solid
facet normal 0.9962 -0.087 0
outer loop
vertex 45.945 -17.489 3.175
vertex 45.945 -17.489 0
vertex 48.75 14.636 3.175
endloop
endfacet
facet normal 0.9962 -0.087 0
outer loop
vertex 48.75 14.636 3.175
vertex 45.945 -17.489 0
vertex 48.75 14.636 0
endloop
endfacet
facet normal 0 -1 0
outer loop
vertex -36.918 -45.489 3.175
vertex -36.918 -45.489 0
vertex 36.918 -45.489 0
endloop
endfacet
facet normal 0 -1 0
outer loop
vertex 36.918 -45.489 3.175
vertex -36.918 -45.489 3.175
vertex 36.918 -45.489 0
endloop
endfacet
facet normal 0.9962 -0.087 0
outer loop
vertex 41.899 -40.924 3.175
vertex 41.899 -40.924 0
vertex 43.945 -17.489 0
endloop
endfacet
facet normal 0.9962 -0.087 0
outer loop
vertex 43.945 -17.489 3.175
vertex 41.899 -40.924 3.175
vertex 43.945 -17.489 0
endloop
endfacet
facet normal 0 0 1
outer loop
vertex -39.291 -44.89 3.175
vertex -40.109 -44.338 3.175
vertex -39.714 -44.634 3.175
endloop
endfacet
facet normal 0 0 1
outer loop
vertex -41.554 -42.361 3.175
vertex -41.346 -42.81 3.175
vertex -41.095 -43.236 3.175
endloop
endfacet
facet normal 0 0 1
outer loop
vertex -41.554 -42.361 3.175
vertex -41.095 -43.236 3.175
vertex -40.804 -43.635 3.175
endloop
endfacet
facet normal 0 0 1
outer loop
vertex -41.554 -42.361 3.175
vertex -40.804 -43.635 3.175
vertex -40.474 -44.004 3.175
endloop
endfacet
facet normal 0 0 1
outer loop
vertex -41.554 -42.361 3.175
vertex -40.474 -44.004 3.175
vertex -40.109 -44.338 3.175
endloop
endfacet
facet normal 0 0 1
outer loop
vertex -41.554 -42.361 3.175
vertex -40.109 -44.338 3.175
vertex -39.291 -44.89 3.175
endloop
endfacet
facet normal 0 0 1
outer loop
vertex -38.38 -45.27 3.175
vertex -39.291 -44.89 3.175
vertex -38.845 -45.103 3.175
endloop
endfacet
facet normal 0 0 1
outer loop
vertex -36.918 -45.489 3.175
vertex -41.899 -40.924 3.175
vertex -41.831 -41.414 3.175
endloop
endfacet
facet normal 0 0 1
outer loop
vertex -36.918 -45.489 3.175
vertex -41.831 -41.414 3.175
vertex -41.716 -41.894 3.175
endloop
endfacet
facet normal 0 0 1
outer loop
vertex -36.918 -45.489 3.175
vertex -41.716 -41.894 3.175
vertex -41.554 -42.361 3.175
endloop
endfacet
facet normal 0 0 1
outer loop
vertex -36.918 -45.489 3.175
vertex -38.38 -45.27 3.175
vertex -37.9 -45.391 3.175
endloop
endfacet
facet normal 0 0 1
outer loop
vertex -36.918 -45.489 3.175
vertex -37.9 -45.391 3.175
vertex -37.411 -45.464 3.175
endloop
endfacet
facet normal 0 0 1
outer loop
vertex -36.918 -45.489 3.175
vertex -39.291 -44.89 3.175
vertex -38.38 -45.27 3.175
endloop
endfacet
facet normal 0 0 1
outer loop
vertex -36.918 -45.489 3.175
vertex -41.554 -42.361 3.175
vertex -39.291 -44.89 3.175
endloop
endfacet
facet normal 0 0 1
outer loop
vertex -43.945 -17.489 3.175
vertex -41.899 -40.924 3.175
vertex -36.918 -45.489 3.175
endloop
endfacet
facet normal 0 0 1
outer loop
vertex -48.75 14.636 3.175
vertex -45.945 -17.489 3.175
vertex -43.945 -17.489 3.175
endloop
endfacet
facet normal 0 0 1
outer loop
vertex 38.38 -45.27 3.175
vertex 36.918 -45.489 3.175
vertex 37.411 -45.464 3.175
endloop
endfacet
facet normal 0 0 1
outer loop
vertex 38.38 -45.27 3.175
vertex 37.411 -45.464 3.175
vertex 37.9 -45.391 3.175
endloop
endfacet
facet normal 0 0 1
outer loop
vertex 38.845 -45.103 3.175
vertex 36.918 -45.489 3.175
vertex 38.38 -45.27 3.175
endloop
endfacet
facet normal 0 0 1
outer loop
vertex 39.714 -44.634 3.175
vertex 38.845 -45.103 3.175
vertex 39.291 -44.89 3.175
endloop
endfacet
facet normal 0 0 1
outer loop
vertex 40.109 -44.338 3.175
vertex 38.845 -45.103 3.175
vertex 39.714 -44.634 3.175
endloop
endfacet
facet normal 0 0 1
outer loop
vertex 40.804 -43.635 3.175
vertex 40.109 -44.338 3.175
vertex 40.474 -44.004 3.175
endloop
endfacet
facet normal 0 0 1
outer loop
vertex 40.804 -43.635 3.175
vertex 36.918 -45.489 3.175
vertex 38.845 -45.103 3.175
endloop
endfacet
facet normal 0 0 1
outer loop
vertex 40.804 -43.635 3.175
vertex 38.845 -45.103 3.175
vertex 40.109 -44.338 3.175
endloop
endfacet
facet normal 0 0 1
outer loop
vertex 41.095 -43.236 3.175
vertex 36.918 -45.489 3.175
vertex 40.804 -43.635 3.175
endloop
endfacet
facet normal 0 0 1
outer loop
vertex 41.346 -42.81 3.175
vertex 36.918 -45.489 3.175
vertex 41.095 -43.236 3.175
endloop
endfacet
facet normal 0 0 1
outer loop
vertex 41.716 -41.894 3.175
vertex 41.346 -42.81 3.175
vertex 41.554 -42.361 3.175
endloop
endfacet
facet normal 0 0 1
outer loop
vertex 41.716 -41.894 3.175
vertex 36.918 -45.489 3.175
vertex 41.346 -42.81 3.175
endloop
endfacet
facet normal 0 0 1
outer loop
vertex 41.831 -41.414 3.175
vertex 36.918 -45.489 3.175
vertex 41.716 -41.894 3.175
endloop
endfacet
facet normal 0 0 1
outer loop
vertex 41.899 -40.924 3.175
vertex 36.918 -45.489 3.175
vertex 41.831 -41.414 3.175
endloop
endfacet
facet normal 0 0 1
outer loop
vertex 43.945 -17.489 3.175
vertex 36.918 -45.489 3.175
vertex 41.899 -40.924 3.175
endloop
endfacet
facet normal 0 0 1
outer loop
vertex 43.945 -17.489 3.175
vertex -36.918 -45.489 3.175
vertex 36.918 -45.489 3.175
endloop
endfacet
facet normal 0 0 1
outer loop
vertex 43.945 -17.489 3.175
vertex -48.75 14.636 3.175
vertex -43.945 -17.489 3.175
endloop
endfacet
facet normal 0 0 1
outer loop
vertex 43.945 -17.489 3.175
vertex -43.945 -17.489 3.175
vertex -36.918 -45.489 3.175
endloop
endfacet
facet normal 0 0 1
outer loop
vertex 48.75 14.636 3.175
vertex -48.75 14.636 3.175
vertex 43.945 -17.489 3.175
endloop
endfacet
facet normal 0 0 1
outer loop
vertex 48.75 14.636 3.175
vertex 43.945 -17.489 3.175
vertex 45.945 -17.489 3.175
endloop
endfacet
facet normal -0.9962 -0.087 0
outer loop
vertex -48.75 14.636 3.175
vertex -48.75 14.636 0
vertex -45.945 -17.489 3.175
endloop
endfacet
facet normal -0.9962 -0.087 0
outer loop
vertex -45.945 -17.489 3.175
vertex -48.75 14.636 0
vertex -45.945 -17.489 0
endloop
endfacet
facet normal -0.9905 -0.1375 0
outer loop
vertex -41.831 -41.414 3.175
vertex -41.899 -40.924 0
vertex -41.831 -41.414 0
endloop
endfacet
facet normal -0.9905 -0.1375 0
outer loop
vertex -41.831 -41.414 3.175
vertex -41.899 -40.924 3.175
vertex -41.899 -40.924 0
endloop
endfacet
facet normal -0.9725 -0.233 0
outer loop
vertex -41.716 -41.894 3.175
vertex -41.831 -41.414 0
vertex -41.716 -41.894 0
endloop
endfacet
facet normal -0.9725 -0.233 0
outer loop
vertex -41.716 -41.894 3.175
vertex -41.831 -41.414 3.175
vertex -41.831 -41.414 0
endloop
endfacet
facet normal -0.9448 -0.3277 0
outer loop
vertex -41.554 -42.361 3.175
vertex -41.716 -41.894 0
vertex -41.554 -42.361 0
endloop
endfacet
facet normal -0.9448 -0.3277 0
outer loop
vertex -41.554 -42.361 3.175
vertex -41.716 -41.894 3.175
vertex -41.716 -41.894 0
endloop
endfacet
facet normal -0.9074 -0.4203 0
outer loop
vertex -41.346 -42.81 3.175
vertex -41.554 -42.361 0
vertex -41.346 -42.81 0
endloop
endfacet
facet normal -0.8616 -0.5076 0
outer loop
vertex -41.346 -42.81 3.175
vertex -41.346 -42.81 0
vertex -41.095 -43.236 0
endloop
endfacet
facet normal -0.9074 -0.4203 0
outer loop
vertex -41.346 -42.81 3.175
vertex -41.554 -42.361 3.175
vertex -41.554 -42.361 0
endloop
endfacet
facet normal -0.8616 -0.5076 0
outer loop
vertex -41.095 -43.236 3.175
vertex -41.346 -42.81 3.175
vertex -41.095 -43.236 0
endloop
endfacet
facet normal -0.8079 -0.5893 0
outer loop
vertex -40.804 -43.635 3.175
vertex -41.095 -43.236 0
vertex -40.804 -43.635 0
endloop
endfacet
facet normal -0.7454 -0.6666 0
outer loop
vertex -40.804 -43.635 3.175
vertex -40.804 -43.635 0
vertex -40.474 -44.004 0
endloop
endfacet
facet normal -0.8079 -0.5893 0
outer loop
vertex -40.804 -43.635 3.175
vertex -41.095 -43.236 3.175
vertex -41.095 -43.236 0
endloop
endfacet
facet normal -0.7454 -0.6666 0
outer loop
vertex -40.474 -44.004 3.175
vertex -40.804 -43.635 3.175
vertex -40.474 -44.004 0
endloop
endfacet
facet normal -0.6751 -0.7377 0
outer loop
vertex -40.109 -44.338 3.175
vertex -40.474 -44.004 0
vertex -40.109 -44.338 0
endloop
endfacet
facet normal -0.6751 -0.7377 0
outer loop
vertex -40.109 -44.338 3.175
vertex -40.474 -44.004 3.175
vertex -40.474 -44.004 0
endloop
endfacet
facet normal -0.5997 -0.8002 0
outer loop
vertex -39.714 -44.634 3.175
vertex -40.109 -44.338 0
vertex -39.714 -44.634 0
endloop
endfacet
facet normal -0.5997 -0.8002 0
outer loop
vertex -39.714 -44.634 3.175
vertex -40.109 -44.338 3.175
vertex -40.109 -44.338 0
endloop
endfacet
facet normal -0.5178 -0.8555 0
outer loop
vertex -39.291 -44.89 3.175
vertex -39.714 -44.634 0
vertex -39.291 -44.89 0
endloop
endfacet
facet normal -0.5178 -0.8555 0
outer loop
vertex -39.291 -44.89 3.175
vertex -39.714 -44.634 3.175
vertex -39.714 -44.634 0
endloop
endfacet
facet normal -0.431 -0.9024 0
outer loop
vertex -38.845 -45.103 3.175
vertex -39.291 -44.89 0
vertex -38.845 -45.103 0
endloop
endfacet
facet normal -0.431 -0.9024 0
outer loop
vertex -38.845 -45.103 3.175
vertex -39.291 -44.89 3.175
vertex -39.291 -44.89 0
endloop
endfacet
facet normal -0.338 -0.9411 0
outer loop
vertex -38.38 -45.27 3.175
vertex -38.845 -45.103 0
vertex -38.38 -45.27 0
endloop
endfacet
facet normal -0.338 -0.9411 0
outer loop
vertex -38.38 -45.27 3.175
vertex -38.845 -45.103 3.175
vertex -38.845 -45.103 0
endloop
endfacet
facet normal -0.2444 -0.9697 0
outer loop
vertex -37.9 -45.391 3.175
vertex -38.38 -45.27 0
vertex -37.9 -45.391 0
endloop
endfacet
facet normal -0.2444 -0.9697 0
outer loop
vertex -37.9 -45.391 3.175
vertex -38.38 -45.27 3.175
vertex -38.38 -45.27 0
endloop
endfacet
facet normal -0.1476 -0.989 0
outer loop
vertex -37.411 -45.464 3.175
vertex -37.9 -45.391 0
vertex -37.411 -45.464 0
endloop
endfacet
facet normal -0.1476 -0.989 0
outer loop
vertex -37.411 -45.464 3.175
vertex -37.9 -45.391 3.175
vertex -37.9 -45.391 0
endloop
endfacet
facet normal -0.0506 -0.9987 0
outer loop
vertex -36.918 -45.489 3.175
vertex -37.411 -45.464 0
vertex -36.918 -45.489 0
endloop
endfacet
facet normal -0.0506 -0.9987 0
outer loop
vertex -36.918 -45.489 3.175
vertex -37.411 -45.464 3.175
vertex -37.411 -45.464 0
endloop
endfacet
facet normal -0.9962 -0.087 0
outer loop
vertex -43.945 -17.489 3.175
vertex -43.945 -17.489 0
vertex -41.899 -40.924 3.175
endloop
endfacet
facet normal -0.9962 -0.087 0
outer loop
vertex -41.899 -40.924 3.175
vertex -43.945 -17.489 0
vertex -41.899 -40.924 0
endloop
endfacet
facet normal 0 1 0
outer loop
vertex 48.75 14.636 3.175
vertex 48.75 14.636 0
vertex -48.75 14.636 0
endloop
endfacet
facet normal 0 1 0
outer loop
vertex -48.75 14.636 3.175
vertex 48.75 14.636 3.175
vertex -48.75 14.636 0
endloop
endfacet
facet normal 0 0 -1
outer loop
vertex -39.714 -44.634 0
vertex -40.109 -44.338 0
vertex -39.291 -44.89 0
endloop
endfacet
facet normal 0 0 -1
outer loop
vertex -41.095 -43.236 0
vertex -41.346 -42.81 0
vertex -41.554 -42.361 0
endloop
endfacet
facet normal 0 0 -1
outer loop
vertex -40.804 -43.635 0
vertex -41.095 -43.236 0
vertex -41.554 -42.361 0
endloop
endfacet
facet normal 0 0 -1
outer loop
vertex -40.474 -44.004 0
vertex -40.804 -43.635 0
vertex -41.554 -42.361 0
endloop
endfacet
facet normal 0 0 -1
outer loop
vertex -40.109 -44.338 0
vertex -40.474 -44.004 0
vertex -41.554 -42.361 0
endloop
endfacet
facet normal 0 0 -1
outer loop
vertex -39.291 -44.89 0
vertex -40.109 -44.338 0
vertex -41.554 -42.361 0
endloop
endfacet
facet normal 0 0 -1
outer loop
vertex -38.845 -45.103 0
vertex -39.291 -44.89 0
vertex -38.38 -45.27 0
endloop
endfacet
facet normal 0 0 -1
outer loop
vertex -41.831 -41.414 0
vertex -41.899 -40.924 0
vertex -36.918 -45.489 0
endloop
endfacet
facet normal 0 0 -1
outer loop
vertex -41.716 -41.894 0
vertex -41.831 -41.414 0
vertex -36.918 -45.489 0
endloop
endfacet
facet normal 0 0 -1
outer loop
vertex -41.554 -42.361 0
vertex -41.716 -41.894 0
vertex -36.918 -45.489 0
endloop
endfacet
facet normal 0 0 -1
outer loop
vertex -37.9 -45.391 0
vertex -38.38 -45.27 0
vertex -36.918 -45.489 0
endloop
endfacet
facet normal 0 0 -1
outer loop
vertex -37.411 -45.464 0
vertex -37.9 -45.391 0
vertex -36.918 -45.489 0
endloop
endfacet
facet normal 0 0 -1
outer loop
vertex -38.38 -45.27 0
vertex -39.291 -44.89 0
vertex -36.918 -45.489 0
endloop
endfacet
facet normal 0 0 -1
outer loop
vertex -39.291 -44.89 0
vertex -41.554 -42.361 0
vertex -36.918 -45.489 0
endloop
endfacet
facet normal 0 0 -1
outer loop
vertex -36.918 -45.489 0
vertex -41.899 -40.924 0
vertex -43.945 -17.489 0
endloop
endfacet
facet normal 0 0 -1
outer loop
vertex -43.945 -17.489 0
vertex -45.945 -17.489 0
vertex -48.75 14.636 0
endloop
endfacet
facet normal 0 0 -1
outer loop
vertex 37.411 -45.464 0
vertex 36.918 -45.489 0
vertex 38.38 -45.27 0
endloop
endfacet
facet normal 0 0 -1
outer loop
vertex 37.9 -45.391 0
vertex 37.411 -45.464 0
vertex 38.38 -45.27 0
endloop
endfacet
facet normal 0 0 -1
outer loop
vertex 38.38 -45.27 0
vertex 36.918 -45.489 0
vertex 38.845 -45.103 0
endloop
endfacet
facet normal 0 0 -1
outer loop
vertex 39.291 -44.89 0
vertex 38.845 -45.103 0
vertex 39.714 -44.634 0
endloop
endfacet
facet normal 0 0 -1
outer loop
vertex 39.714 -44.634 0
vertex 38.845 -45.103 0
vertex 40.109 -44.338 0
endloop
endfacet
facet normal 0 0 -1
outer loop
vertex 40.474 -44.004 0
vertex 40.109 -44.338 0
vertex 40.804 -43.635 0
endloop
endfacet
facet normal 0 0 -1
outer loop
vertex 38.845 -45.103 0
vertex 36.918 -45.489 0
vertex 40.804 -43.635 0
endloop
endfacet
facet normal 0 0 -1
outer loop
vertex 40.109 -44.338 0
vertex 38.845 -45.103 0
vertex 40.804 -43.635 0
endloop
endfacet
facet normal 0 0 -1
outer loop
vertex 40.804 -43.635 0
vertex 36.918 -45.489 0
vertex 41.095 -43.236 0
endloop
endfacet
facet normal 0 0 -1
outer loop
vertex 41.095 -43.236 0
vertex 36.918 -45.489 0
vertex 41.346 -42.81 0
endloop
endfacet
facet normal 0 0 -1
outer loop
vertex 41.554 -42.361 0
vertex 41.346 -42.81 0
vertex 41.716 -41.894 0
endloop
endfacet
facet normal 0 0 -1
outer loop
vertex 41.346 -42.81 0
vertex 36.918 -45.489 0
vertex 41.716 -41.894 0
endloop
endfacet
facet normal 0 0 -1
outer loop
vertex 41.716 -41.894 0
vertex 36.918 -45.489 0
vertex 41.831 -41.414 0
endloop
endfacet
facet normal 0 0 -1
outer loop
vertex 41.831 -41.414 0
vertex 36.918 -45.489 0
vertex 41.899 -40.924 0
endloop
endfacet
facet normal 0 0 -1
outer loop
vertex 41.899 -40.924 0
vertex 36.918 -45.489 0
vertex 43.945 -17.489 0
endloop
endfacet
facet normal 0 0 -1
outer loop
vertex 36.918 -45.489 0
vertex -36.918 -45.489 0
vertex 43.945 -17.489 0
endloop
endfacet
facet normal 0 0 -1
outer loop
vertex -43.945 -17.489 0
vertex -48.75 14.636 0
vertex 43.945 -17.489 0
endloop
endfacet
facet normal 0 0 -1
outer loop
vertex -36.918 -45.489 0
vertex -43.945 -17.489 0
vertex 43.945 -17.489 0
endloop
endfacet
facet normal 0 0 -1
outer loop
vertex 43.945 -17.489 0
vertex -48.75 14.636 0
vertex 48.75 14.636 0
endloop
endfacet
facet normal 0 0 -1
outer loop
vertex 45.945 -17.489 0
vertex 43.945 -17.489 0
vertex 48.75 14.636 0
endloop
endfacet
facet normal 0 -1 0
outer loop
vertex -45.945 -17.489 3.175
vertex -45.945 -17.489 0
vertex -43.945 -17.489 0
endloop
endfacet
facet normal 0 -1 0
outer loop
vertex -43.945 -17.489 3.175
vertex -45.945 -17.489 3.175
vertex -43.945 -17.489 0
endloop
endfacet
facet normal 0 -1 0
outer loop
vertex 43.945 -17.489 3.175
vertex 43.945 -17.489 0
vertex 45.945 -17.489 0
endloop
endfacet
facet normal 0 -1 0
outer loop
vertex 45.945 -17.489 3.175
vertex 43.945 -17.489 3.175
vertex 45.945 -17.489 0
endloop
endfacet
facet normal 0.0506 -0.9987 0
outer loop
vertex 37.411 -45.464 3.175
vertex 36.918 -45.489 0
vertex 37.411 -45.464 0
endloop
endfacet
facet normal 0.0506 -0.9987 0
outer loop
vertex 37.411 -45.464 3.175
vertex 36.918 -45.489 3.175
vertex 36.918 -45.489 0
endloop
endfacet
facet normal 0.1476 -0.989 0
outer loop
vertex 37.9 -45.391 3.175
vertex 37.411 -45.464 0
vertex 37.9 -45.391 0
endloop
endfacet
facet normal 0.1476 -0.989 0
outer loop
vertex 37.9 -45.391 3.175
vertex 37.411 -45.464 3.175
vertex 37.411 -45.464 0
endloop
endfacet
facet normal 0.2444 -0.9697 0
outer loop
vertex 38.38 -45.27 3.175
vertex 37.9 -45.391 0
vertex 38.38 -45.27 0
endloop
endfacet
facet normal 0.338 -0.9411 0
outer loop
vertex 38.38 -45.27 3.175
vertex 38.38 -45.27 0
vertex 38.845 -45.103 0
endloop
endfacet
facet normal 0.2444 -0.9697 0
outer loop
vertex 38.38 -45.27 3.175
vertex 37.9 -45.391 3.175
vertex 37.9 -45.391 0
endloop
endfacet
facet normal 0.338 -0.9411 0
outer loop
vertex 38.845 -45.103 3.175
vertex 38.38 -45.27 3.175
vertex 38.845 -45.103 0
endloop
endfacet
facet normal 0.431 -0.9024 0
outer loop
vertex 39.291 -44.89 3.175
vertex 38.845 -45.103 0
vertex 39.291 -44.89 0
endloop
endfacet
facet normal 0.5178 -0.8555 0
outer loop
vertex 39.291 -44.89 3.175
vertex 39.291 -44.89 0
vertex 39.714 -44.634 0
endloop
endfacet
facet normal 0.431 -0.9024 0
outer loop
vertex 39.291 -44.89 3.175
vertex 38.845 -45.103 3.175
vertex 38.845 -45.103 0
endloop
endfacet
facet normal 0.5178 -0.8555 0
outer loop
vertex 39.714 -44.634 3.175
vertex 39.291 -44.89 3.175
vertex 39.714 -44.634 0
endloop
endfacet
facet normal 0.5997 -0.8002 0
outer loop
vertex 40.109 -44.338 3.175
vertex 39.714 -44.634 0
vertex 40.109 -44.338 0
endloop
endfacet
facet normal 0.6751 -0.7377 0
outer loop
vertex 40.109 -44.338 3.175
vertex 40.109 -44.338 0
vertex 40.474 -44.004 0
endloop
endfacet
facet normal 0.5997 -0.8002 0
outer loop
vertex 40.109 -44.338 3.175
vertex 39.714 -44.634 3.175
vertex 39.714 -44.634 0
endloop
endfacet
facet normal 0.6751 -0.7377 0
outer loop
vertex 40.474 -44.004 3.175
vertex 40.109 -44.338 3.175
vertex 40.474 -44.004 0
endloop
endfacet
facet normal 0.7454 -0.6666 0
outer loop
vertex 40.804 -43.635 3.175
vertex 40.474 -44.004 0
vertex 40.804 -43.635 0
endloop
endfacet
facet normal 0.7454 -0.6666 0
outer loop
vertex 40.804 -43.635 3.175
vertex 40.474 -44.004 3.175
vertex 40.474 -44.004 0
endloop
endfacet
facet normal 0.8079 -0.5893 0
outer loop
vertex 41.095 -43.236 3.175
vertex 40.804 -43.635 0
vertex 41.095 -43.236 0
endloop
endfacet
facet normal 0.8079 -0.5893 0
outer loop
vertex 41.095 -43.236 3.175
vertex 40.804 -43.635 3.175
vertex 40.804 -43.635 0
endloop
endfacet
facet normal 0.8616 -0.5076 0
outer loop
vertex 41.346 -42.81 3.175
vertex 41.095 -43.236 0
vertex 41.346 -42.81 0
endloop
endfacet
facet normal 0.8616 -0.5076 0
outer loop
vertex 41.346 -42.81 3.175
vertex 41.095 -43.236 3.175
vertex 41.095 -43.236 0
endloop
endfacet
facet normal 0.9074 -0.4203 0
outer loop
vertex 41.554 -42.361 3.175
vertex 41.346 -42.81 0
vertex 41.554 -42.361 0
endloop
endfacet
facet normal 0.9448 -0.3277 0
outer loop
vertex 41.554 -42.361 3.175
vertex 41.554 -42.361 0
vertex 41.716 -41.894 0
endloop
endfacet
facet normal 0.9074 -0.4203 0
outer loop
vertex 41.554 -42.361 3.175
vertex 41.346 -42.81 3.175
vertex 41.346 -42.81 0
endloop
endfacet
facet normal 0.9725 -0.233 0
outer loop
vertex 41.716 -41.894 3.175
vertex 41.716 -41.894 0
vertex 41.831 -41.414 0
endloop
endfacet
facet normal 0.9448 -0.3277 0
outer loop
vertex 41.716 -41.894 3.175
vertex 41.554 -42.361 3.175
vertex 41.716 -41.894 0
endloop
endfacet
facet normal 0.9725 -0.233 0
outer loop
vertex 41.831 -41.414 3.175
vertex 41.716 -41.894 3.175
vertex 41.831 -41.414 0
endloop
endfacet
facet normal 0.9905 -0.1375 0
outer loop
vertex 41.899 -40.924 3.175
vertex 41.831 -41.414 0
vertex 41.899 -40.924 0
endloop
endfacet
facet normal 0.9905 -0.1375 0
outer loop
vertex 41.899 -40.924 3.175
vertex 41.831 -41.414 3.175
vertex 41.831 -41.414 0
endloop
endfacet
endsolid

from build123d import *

# Parameters (mm, degrees)
F1_DEPTH = 3.175
F2_R     = 5


with BuildPart() as f1:
    # F0 (on Top) → F1 (new body)
    with BuildSketch(Plane.XY):
        Polygon((48.75, 14.636084), (-48.75, 14.636084), (-45.944906, -17.488916), (-43.944906, -17.488916), (-41.5, -45.488916), (0, -45.488916), (41.5, -45.488916), (43.944906, -17.488916), (45.944906, -17.488916), align=None)
    extrude(amount=F1_DEPTH)

    # F2
    f2_edges = [f1.edges().sort_by_distance(p)[0] for p in [
        (-41.5, -45.488916, 1.5875),
        (41.5, -45.488916, 1.5875),
    ]]
    fillet(f2_edges, radius=F2_R)


solid = f1.part
